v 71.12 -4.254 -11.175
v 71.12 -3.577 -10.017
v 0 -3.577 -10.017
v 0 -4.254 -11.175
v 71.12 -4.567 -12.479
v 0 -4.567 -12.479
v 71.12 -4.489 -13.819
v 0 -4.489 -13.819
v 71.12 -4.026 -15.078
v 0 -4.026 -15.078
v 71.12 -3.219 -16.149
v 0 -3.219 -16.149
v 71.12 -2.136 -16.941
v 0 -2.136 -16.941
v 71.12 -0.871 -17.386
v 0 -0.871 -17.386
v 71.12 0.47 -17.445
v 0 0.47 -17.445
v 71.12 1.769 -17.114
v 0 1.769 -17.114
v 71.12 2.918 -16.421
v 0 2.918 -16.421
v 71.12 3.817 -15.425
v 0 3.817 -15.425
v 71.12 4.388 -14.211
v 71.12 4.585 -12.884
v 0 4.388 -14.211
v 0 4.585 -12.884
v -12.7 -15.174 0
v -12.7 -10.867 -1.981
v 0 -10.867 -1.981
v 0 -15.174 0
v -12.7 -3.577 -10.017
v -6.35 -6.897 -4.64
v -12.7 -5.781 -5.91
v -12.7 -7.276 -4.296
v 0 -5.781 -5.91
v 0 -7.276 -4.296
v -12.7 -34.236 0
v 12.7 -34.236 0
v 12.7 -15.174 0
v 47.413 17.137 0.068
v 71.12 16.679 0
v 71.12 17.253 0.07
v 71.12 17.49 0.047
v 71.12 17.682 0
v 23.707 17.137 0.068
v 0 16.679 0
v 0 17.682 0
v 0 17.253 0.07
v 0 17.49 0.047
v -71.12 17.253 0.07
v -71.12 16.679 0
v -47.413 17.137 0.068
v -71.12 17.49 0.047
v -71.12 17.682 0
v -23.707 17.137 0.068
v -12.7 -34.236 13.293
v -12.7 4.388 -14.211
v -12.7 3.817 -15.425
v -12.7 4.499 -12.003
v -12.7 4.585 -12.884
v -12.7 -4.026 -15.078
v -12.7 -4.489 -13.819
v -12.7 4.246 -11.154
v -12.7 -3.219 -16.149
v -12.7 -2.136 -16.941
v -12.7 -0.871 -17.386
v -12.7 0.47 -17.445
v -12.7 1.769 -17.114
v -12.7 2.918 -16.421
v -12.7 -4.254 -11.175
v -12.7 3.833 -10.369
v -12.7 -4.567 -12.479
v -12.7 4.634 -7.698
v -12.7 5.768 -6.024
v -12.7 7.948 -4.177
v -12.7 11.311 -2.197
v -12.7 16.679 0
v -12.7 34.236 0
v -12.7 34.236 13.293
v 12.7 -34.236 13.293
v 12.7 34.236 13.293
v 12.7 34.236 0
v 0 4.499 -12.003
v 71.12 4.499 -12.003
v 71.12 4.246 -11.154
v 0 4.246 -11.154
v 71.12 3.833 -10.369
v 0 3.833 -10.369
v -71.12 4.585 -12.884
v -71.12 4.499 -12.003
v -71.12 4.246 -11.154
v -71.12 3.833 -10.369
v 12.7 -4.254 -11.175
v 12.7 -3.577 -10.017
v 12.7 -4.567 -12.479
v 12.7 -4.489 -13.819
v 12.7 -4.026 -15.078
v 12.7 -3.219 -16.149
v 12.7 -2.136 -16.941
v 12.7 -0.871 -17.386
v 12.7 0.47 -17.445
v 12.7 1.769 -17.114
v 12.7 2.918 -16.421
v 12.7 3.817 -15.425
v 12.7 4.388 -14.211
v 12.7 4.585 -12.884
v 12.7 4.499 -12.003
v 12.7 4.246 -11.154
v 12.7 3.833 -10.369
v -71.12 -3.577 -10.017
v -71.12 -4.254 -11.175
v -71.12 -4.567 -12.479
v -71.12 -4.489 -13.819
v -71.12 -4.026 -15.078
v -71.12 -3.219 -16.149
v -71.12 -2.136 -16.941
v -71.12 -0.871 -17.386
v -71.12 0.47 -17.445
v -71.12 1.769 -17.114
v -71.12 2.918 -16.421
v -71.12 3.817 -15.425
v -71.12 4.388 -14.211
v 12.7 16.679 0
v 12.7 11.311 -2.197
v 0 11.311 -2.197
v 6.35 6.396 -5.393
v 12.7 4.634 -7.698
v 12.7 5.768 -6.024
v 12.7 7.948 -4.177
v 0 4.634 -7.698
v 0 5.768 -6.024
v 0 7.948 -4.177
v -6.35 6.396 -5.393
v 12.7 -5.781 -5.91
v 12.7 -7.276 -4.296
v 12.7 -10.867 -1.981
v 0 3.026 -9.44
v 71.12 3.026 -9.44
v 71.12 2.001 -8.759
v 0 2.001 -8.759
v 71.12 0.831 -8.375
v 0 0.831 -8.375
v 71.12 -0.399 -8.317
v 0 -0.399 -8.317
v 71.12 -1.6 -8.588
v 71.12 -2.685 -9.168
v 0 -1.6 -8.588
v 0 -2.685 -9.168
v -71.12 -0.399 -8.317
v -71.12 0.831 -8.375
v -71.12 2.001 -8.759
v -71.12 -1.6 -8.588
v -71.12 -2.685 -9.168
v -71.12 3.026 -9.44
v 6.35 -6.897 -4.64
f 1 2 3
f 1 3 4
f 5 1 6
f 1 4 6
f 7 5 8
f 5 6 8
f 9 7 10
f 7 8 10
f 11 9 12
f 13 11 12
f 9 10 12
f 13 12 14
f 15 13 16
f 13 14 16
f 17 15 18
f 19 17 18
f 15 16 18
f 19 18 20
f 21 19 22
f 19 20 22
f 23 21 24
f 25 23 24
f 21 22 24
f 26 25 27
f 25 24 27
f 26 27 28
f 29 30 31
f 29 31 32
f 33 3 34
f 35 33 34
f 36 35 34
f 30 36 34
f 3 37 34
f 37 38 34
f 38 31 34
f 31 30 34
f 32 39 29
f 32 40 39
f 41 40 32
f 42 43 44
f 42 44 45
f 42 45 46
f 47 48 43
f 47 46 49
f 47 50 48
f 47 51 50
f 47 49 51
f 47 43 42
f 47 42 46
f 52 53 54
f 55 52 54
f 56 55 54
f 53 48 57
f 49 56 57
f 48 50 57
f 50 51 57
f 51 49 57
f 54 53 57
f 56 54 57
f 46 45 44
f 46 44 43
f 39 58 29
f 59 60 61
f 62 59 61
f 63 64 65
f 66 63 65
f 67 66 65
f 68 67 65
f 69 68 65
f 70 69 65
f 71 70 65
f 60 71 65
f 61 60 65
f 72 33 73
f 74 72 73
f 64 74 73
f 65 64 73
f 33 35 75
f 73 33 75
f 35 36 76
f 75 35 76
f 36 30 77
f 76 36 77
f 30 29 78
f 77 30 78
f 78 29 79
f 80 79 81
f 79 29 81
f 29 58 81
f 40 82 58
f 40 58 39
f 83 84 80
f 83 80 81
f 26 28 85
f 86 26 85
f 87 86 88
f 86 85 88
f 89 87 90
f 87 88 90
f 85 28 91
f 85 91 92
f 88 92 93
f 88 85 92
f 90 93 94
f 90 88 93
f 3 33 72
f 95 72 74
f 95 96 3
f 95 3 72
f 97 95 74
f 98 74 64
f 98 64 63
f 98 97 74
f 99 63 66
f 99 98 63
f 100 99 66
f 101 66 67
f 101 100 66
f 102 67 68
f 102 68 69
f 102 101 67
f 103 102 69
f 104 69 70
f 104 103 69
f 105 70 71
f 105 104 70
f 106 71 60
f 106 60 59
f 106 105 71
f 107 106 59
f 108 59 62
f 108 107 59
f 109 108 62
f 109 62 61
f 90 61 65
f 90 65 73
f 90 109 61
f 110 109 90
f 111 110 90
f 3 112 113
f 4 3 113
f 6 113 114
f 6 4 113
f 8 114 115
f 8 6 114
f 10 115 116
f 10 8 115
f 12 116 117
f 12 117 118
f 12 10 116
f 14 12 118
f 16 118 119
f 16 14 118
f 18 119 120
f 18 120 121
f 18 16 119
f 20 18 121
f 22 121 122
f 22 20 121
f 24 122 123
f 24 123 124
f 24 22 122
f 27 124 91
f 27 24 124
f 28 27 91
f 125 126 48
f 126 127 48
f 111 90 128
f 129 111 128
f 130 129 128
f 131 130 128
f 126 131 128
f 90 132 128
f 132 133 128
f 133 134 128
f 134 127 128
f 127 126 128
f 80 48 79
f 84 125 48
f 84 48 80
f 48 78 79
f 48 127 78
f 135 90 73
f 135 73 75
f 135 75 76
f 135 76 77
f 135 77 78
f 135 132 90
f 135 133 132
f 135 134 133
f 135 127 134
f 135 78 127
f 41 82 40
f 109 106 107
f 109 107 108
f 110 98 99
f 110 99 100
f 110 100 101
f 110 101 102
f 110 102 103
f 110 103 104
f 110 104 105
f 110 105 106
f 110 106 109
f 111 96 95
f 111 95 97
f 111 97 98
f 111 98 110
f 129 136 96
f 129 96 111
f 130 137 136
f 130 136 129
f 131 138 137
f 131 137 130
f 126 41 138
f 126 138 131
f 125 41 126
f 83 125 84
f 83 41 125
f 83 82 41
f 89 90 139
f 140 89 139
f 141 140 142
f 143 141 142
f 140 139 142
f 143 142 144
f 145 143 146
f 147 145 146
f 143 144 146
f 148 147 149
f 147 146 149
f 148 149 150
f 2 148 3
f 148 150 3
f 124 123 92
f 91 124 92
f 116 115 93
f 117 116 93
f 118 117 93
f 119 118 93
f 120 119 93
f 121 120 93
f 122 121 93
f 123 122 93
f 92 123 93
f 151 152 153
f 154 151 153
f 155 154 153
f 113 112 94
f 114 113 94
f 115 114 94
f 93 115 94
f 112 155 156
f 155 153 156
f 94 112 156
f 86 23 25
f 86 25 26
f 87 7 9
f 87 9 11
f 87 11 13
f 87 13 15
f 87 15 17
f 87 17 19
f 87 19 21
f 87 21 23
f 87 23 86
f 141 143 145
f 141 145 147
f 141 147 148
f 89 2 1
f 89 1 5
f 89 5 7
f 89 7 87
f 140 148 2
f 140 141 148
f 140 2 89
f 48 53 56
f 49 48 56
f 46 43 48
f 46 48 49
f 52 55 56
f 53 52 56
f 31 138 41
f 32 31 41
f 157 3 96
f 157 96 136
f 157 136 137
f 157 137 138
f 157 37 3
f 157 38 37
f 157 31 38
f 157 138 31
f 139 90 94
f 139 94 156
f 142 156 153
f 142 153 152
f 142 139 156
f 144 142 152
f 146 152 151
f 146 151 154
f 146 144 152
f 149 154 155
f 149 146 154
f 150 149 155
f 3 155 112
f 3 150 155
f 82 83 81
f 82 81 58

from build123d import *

# Parameters (mm, degrees)
F1_DEPTH = 71.12
F2_DEPTH = 12.7


with BuildPart() as f1:
    # F0 (on Right) → F1 (new body, symmetric)
    with BuildSketch(Plane.YZ):
        with BuildLine():
            ThreePointArc((-3.5772807297, -10.0167868583), (-1.5196570548, -17.2098026647), (4.5847, -12.8842834444))
            ThreePointArc((4.5847, -12.8842834444), (4.3928679628, -11.5719629228), (3.8334250414, -10.3694620706))
            ThreePointArc((3.8334250414, -10.3694620706), (0.2179390476, -8.304766367), (-3.5772807297, -10.0167868583))
        make_face()
    extrude(amount=F1_DEPTH, both=True)


with BuildPart() as f1b:
    # F0 (on Right) → F1, piece 2 (new body, symmetric)
    with BuildSketch(Plane.YZ):
        with BuildLine():
            add(Edge.make_bspline(
                [(16.6792012751, 0), (17.2352067537, 0.12198039), (17.4606638005, 0.0610249655), (17.682461068, 0)],
                knots=[0.8521618943, 0.8521618943, 0.8521618943, 0.8521618943, 1, 1, 1, 1], degree=3))
            Line((16.6792012751, 0), (17.682461068, 0))
        make_face()
    extrude(amount=F1_DEPTH, both=True)


with BuildPart() as f2:
    # F0 (on Right) → F2 (new body, symmetric)
    with BuildSketch(Plane.YZ):
        with BuildLine():
            ThreePointArc((-3.5772807297, -10.0167868583), (-1.5196570548, -17.2098026647), (4.5847, -12.8842834444))
            ThreePointArc((4.5847, -12.8842834444), (4.3928679628, -11.5719629228), (3.8334250414, -10.3694620706))
            ThreePointArc((3.8334250414, -10.3694620706), (0.2179390476, -8.304766367), (-3.5772807297, -10.0167868583))
        make_face()
        with BuildLine():
            ThreePointArc((-3.5772807297, -10.0167868583), (0.2179390476, -8.304766367), (3.8334250414, -10.3694620706))
            add(Edge.make_bspline(
                [(3.8334250414, -10.3694620706), (4.1484940345, -8.7462774015), (5.1007491044, -4.7054371148), (14.7876531546, -0.4149811222), (16.6792012751, 0)],
                knots=[0, 0, 0, 0, 0.3492120103, 0.8521618943, 0.8521618943, 0.8521618943, 0.8521618943], degree=3))
            Line((16.6792012751, 0), (-15.1743106544, 0))
            add(Edge.make_bspline(
                [(-3.5772807297, -10.0167868583), (-4.4214296894, -8.1091133852), (-6.3202305252, -3.8500304601), (-12.0298605248, -1.3672692408), (-15.1743106544, 0)],
                knots=[0, 0, 0, 0, 0.4493592658, 1, 1, 1, 1], degree=3))
        make_face()
        with BuildLine():
            Line((-15.1743106544, 0), (16.6792012751, 0))
            add(Edge.make_bspline(
                [(16.6792012751, 0), (17.2352067537, 0.12198039), (17.4606638005, 0.0610249655), (17.682461068, 0)],
                knots=[0.8521618943, 0.8521618943, 0.8521618943, 0.8521618943, 1, 1, 1, 1], degree=3))
            Line((17.682461068, 0), (34.2362560332, 0))
            Line((34.2362560332, 0), (34.2362560332, 13.2931983098))
            Line((34.2362560332, 13.2931983098), (-34.2362560332, 13.2931983098))
            Line((-34.2362560332, 13.2931983098), (-34.2362560332, 0))
            Line((-34.2362560332, 0), (-15.1743106544, 0))
        make_face()
        with BuildLine():
            add(Edge.make_bspline(
                [(16.6792012751, 0), (17.2352067537, 0.12198039), (17.4606638005, 0.0610249655), (17.682461068, 0)],
                knots=[0.8521618943, 0.8521618943, 0.8521618943, 0.8521618943, 1, 1, 1, 1], degree=3))
            Line((16.6792012751, 0), (17.682461068, 0))
        make_face()
    extrude(amount=F2_DEPTH, both=True)


solid = Compound([f1.part, f1b.part, f2.part])
